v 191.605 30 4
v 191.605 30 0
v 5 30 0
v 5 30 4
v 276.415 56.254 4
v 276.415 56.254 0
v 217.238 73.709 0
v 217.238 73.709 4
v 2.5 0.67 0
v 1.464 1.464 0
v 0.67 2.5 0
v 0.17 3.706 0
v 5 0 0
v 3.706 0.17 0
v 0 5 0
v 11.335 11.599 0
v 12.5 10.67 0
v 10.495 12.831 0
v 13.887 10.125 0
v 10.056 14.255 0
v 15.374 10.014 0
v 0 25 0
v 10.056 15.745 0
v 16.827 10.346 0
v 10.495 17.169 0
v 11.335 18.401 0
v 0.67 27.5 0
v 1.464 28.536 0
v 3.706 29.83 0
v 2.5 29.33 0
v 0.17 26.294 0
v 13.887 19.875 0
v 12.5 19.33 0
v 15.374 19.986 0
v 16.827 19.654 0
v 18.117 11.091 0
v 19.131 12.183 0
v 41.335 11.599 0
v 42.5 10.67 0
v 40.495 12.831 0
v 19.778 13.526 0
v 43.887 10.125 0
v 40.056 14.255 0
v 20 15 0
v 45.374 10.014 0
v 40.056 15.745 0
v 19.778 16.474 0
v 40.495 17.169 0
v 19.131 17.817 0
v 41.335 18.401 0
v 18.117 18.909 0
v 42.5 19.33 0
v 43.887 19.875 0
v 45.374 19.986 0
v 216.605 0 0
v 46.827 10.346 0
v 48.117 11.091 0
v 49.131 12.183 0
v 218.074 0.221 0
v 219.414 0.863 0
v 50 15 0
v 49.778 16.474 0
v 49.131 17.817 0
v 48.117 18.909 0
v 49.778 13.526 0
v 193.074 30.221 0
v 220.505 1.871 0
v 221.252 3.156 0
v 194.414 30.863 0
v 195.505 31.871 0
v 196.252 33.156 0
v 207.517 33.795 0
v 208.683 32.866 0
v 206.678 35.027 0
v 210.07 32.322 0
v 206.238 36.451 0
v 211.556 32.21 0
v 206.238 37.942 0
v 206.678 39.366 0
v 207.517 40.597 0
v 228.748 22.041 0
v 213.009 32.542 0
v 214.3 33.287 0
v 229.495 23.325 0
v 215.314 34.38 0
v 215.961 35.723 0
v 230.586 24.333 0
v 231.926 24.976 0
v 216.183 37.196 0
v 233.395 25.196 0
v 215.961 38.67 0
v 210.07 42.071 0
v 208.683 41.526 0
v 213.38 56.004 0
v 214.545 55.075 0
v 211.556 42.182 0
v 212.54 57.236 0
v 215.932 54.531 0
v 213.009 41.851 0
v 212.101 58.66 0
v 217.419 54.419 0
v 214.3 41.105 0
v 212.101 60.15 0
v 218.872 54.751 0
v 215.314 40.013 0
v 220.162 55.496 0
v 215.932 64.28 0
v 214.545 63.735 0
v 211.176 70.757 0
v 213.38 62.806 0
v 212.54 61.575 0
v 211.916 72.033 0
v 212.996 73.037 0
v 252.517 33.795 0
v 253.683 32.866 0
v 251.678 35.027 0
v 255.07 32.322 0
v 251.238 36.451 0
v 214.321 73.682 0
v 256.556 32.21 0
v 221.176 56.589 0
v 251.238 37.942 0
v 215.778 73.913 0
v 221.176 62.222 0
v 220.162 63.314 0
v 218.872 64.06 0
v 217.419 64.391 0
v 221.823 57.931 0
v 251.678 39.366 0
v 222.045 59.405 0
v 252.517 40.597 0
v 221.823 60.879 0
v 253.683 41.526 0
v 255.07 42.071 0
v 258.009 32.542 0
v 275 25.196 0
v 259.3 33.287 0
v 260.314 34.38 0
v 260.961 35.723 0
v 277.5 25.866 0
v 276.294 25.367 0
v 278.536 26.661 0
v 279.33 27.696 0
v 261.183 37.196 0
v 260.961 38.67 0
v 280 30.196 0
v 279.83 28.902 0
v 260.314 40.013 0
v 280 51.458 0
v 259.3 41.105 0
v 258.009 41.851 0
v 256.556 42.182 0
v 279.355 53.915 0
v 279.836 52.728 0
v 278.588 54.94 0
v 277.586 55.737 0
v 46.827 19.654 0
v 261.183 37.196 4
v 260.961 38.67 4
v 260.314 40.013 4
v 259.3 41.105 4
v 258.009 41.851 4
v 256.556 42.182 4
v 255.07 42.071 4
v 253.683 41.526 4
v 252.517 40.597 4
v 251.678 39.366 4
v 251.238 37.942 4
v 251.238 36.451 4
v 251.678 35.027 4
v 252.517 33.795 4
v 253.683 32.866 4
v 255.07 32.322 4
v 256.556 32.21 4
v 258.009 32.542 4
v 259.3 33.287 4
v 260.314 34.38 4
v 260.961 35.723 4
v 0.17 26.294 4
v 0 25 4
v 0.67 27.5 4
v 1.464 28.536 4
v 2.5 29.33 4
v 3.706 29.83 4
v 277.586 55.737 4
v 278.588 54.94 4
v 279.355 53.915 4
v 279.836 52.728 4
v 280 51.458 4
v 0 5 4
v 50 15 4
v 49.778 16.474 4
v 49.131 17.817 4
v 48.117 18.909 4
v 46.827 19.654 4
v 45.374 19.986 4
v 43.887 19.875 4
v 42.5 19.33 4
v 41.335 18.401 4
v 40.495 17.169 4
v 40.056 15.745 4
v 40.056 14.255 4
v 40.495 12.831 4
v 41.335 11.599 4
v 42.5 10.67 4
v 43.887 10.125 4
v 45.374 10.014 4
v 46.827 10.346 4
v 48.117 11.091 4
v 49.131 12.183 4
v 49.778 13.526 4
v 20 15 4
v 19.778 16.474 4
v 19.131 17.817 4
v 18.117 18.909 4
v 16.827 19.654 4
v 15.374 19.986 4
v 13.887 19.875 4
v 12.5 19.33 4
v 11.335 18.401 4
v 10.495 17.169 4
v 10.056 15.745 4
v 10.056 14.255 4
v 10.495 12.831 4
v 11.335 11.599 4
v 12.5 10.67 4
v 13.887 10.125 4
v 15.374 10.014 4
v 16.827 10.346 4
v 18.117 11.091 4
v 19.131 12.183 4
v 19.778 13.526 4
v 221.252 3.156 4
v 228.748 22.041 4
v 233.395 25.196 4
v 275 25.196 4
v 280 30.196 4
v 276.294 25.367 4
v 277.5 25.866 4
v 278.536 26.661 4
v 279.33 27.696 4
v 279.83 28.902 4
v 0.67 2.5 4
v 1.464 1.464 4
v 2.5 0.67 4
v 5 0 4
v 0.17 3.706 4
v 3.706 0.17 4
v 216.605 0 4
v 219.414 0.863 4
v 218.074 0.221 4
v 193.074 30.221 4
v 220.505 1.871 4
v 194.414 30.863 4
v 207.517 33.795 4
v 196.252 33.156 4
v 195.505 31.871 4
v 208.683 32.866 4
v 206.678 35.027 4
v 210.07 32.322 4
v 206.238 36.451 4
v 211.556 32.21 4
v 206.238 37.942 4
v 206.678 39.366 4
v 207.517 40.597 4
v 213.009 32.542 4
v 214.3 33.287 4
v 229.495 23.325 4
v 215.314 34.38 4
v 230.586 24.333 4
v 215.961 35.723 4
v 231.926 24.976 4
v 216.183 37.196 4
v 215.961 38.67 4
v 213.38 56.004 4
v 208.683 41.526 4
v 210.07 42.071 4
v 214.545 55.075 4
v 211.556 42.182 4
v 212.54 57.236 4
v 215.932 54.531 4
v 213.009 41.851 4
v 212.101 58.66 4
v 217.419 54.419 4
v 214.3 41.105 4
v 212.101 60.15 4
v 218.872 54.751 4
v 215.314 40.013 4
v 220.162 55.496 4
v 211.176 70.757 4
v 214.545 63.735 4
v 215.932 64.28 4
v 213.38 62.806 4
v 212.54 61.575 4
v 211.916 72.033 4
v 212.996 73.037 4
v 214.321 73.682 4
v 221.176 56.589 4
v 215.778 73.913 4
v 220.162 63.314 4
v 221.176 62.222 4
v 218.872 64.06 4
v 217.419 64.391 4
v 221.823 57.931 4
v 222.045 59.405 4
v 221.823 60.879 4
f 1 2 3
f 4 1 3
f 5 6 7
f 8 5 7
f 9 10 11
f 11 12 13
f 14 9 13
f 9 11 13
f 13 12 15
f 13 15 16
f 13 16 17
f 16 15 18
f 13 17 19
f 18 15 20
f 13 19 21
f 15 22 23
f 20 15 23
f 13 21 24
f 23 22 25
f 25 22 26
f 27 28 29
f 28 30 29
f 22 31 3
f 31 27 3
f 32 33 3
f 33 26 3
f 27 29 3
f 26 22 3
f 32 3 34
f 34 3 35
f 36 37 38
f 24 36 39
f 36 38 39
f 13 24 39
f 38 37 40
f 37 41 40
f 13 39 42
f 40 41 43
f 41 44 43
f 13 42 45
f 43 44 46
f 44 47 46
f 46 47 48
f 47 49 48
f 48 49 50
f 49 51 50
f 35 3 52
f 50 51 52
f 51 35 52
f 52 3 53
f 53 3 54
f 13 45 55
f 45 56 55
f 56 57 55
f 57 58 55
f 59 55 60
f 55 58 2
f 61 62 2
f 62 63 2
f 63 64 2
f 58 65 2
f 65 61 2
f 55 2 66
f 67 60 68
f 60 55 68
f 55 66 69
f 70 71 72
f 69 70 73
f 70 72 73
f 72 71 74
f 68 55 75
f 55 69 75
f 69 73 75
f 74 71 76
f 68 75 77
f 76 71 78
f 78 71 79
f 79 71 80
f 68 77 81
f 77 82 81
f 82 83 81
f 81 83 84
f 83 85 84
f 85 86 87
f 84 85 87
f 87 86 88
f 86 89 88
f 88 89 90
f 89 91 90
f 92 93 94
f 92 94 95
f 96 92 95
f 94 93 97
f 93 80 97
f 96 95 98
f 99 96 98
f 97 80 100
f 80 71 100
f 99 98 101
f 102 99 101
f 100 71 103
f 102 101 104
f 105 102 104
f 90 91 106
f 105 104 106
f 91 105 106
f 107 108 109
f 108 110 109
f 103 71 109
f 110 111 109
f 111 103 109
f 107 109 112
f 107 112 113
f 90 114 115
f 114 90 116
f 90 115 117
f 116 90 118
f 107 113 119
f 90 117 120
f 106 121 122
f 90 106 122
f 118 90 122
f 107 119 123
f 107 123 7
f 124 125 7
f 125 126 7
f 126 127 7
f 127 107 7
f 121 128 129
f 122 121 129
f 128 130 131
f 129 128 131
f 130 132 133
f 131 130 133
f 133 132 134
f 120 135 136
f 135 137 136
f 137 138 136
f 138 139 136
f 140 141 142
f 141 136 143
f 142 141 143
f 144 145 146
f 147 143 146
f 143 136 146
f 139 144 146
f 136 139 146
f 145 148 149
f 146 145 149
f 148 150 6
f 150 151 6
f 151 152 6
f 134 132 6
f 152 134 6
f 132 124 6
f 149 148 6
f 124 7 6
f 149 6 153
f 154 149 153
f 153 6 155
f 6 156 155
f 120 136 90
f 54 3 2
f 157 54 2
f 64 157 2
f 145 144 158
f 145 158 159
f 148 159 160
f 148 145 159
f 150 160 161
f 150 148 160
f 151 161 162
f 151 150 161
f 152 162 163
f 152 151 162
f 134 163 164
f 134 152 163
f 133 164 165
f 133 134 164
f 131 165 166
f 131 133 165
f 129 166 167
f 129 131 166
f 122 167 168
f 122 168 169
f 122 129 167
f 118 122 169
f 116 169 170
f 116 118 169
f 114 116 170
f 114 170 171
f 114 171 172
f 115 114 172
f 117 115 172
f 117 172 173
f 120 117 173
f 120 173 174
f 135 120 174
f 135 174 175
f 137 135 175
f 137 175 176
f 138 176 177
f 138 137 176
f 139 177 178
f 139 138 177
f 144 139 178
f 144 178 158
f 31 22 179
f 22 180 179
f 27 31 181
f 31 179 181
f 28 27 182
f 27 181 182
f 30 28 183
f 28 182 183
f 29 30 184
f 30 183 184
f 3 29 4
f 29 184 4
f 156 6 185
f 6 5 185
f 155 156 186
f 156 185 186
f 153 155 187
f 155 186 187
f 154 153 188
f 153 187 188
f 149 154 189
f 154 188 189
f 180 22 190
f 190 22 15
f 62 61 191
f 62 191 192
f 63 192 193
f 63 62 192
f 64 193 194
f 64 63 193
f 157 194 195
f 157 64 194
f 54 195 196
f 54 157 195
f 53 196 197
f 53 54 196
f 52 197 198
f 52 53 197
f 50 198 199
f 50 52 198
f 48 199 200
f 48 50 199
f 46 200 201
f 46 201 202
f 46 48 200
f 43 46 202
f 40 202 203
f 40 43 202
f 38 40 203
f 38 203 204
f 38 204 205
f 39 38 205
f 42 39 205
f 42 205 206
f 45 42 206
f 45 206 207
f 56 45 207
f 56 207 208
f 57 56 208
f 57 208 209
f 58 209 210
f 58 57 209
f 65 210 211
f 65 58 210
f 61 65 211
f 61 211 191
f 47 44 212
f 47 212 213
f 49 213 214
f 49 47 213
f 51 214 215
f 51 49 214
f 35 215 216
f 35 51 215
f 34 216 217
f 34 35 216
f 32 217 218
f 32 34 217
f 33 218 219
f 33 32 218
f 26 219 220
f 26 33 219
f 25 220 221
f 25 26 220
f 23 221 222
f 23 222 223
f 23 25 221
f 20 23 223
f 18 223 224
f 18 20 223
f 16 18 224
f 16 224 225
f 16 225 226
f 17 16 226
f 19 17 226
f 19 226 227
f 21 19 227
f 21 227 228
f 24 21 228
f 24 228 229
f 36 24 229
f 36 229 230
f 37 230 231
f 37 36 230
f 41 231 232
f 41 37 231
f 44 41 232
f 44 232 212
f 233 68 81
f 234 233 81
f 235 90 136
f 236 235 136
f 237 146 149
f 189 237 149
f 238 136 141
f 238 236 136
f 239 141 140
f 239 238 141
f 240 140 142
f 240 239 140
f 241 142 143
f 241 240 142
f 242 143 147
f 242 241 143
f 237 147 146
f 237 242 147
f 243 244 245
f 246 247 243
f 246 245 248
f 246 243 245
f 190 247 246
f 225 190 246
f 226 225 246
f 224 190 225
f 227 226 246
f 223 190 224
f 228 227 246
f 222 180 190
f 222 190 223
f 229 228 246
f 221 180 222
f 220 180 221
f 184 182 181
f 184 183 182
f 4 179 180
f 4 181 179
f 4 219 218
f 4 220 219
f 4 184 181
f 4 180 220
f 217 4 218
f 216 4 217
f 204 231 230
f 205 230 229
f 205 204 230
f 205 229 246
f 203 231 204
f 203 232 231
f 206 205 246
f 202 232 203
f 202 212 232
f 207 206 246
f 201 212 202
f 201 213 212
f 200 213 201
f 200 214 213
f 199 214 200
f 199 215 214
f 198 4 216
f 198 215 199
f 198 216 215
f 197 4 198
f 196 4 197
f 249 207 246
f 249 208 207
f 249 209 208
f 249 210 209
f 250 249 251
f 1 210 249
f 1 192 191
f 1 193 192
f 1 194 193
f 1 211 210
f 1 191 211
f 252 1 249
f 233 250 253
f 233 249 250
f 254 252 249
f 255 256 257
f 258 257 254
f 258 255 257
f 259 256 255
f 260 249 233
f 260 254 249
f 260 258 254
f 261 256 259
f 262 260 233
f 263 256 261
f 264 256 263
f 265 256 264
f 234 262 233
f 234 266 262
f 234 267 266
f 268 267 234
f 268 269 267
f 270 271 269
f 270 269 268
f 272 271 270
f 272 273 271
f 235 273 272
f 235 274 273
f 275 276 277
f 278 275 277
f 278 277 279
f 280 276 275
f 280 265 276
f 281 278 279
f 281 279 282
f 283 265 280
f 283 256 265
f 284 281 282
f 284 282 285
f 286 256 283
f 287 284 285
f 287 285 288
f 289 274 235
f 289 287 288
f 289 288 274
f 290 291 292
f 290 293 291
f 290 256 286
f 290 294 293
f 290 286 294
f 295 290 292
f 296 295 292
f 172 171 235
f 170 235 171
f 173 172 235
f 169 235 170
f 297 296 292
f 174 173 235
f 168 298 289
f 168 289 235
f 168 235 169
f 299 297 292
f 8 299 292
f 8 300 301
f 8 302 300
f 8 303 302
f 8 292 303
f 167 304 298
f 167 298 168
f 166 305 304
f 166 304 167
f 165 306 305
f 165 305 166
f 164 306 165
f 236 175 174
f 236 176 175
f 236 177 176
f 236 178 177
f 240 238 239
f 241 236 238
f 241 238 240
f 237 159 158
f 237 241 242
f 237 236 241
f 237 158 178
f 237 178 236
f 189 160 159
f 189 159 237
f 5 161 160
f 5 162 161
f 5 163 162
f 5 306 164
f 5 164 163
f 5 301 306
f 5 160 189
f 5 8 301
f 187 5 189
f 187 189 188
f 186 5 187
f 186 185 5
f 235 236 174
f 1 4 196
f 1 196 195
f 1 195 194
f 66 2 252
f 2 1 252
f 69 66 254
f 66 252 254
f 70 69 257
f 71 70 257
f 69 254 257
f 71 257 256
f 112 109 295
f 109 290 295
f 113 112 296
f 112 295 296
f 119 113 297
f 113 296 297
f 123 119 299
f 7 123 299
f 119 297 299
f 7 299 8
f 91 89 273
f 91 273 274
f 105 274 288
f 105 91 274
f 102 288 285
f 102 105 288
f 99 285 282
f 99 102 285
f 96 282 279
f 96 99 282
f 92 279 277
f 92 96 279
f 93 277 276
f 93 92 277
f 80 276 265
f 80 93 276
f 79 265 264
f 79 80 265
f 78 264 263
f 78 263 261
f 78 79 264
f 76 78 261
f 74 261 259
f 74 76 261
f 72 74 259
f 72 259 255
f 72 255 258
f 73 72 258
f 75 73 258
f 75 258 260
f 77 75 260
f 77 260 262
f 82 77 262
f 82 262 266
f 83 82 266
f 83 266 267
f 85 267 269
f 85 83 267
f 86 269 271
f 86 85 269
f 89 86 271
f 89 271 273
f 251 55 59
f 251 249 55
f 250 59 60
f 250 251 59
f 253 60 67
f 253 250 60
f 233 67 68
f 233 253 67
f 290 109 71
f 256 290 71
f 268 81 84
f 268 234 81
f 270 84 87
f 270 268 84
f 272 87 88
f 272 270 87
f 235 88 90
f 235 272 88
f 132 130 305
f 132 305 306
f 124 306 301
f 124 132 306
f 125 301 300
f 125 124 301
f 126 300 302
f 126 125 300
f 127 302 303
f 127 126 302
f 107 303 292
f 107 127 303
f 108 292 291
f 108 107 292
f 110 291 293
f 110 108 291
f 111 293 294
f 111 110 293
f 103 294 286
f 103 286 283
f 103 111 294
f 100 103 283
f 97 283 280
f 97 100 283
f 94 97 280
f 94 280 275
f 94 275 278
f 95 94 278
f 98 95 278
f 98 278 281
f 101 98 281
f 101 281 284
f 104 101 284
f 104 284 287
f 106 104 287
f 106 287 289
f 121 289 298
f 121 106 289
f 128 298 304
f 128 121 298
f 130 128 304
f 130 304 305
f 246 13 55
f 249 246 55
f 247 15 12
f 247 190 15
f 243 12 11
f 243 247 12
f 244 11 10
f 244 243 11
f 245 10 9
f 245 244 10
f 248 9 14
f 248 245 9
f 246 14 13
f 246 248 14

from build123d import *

# Parameters (mm, degrees)
F0_R     = 5
F1_DEPTH = 4
F2_R     = 5


with BuildPart() as f1:
    # F0 (on Top) → F1 (new body)
    with BuildSketch(Plane.XY):
        Polygon((0, 30), (0, 0), (220, 0), (230, 25.196342), (280, 25.196342), (280, 55.196342), (212.859735, 75), (195, 30), align=None)
        with Locations((15, 15)):
            Circle(F0_R, mode=Mode.SUBTRACT)
        with Locations((45, 15)):
            Circle(F0_R, mode=Mode.SUBTRACT)
        with Locations((211.182641, 37.196342)):
            Circle(F0_R, mode=Mode.SUBTRACT)
        with Locations((256.182641, 37.196342)):
            Circle(F0_R, mode=Mode.SUBTRACT)
        with Locations((217.044881, 59.405253)):
            Circle(F0_R, mode=Mode.SUBTRACT)
    extrude(amount=F1_DEPTH)

    # F2
    f2_edges = [f1.edges().sort_by_distance(p)[0] for p in [
        (0, 30, 2),
        (0, 0, 2),
        (220, 0, 2),
        (280, 25.196342, 2),
        (280, 55.196342, 2),
        (212.859735, 75, 2),
        (195, 30, 2),
        (230, 25.196342, 2),
    ]]
    fillet(f2_edges, radius=F2_R)


solid = f1.part
